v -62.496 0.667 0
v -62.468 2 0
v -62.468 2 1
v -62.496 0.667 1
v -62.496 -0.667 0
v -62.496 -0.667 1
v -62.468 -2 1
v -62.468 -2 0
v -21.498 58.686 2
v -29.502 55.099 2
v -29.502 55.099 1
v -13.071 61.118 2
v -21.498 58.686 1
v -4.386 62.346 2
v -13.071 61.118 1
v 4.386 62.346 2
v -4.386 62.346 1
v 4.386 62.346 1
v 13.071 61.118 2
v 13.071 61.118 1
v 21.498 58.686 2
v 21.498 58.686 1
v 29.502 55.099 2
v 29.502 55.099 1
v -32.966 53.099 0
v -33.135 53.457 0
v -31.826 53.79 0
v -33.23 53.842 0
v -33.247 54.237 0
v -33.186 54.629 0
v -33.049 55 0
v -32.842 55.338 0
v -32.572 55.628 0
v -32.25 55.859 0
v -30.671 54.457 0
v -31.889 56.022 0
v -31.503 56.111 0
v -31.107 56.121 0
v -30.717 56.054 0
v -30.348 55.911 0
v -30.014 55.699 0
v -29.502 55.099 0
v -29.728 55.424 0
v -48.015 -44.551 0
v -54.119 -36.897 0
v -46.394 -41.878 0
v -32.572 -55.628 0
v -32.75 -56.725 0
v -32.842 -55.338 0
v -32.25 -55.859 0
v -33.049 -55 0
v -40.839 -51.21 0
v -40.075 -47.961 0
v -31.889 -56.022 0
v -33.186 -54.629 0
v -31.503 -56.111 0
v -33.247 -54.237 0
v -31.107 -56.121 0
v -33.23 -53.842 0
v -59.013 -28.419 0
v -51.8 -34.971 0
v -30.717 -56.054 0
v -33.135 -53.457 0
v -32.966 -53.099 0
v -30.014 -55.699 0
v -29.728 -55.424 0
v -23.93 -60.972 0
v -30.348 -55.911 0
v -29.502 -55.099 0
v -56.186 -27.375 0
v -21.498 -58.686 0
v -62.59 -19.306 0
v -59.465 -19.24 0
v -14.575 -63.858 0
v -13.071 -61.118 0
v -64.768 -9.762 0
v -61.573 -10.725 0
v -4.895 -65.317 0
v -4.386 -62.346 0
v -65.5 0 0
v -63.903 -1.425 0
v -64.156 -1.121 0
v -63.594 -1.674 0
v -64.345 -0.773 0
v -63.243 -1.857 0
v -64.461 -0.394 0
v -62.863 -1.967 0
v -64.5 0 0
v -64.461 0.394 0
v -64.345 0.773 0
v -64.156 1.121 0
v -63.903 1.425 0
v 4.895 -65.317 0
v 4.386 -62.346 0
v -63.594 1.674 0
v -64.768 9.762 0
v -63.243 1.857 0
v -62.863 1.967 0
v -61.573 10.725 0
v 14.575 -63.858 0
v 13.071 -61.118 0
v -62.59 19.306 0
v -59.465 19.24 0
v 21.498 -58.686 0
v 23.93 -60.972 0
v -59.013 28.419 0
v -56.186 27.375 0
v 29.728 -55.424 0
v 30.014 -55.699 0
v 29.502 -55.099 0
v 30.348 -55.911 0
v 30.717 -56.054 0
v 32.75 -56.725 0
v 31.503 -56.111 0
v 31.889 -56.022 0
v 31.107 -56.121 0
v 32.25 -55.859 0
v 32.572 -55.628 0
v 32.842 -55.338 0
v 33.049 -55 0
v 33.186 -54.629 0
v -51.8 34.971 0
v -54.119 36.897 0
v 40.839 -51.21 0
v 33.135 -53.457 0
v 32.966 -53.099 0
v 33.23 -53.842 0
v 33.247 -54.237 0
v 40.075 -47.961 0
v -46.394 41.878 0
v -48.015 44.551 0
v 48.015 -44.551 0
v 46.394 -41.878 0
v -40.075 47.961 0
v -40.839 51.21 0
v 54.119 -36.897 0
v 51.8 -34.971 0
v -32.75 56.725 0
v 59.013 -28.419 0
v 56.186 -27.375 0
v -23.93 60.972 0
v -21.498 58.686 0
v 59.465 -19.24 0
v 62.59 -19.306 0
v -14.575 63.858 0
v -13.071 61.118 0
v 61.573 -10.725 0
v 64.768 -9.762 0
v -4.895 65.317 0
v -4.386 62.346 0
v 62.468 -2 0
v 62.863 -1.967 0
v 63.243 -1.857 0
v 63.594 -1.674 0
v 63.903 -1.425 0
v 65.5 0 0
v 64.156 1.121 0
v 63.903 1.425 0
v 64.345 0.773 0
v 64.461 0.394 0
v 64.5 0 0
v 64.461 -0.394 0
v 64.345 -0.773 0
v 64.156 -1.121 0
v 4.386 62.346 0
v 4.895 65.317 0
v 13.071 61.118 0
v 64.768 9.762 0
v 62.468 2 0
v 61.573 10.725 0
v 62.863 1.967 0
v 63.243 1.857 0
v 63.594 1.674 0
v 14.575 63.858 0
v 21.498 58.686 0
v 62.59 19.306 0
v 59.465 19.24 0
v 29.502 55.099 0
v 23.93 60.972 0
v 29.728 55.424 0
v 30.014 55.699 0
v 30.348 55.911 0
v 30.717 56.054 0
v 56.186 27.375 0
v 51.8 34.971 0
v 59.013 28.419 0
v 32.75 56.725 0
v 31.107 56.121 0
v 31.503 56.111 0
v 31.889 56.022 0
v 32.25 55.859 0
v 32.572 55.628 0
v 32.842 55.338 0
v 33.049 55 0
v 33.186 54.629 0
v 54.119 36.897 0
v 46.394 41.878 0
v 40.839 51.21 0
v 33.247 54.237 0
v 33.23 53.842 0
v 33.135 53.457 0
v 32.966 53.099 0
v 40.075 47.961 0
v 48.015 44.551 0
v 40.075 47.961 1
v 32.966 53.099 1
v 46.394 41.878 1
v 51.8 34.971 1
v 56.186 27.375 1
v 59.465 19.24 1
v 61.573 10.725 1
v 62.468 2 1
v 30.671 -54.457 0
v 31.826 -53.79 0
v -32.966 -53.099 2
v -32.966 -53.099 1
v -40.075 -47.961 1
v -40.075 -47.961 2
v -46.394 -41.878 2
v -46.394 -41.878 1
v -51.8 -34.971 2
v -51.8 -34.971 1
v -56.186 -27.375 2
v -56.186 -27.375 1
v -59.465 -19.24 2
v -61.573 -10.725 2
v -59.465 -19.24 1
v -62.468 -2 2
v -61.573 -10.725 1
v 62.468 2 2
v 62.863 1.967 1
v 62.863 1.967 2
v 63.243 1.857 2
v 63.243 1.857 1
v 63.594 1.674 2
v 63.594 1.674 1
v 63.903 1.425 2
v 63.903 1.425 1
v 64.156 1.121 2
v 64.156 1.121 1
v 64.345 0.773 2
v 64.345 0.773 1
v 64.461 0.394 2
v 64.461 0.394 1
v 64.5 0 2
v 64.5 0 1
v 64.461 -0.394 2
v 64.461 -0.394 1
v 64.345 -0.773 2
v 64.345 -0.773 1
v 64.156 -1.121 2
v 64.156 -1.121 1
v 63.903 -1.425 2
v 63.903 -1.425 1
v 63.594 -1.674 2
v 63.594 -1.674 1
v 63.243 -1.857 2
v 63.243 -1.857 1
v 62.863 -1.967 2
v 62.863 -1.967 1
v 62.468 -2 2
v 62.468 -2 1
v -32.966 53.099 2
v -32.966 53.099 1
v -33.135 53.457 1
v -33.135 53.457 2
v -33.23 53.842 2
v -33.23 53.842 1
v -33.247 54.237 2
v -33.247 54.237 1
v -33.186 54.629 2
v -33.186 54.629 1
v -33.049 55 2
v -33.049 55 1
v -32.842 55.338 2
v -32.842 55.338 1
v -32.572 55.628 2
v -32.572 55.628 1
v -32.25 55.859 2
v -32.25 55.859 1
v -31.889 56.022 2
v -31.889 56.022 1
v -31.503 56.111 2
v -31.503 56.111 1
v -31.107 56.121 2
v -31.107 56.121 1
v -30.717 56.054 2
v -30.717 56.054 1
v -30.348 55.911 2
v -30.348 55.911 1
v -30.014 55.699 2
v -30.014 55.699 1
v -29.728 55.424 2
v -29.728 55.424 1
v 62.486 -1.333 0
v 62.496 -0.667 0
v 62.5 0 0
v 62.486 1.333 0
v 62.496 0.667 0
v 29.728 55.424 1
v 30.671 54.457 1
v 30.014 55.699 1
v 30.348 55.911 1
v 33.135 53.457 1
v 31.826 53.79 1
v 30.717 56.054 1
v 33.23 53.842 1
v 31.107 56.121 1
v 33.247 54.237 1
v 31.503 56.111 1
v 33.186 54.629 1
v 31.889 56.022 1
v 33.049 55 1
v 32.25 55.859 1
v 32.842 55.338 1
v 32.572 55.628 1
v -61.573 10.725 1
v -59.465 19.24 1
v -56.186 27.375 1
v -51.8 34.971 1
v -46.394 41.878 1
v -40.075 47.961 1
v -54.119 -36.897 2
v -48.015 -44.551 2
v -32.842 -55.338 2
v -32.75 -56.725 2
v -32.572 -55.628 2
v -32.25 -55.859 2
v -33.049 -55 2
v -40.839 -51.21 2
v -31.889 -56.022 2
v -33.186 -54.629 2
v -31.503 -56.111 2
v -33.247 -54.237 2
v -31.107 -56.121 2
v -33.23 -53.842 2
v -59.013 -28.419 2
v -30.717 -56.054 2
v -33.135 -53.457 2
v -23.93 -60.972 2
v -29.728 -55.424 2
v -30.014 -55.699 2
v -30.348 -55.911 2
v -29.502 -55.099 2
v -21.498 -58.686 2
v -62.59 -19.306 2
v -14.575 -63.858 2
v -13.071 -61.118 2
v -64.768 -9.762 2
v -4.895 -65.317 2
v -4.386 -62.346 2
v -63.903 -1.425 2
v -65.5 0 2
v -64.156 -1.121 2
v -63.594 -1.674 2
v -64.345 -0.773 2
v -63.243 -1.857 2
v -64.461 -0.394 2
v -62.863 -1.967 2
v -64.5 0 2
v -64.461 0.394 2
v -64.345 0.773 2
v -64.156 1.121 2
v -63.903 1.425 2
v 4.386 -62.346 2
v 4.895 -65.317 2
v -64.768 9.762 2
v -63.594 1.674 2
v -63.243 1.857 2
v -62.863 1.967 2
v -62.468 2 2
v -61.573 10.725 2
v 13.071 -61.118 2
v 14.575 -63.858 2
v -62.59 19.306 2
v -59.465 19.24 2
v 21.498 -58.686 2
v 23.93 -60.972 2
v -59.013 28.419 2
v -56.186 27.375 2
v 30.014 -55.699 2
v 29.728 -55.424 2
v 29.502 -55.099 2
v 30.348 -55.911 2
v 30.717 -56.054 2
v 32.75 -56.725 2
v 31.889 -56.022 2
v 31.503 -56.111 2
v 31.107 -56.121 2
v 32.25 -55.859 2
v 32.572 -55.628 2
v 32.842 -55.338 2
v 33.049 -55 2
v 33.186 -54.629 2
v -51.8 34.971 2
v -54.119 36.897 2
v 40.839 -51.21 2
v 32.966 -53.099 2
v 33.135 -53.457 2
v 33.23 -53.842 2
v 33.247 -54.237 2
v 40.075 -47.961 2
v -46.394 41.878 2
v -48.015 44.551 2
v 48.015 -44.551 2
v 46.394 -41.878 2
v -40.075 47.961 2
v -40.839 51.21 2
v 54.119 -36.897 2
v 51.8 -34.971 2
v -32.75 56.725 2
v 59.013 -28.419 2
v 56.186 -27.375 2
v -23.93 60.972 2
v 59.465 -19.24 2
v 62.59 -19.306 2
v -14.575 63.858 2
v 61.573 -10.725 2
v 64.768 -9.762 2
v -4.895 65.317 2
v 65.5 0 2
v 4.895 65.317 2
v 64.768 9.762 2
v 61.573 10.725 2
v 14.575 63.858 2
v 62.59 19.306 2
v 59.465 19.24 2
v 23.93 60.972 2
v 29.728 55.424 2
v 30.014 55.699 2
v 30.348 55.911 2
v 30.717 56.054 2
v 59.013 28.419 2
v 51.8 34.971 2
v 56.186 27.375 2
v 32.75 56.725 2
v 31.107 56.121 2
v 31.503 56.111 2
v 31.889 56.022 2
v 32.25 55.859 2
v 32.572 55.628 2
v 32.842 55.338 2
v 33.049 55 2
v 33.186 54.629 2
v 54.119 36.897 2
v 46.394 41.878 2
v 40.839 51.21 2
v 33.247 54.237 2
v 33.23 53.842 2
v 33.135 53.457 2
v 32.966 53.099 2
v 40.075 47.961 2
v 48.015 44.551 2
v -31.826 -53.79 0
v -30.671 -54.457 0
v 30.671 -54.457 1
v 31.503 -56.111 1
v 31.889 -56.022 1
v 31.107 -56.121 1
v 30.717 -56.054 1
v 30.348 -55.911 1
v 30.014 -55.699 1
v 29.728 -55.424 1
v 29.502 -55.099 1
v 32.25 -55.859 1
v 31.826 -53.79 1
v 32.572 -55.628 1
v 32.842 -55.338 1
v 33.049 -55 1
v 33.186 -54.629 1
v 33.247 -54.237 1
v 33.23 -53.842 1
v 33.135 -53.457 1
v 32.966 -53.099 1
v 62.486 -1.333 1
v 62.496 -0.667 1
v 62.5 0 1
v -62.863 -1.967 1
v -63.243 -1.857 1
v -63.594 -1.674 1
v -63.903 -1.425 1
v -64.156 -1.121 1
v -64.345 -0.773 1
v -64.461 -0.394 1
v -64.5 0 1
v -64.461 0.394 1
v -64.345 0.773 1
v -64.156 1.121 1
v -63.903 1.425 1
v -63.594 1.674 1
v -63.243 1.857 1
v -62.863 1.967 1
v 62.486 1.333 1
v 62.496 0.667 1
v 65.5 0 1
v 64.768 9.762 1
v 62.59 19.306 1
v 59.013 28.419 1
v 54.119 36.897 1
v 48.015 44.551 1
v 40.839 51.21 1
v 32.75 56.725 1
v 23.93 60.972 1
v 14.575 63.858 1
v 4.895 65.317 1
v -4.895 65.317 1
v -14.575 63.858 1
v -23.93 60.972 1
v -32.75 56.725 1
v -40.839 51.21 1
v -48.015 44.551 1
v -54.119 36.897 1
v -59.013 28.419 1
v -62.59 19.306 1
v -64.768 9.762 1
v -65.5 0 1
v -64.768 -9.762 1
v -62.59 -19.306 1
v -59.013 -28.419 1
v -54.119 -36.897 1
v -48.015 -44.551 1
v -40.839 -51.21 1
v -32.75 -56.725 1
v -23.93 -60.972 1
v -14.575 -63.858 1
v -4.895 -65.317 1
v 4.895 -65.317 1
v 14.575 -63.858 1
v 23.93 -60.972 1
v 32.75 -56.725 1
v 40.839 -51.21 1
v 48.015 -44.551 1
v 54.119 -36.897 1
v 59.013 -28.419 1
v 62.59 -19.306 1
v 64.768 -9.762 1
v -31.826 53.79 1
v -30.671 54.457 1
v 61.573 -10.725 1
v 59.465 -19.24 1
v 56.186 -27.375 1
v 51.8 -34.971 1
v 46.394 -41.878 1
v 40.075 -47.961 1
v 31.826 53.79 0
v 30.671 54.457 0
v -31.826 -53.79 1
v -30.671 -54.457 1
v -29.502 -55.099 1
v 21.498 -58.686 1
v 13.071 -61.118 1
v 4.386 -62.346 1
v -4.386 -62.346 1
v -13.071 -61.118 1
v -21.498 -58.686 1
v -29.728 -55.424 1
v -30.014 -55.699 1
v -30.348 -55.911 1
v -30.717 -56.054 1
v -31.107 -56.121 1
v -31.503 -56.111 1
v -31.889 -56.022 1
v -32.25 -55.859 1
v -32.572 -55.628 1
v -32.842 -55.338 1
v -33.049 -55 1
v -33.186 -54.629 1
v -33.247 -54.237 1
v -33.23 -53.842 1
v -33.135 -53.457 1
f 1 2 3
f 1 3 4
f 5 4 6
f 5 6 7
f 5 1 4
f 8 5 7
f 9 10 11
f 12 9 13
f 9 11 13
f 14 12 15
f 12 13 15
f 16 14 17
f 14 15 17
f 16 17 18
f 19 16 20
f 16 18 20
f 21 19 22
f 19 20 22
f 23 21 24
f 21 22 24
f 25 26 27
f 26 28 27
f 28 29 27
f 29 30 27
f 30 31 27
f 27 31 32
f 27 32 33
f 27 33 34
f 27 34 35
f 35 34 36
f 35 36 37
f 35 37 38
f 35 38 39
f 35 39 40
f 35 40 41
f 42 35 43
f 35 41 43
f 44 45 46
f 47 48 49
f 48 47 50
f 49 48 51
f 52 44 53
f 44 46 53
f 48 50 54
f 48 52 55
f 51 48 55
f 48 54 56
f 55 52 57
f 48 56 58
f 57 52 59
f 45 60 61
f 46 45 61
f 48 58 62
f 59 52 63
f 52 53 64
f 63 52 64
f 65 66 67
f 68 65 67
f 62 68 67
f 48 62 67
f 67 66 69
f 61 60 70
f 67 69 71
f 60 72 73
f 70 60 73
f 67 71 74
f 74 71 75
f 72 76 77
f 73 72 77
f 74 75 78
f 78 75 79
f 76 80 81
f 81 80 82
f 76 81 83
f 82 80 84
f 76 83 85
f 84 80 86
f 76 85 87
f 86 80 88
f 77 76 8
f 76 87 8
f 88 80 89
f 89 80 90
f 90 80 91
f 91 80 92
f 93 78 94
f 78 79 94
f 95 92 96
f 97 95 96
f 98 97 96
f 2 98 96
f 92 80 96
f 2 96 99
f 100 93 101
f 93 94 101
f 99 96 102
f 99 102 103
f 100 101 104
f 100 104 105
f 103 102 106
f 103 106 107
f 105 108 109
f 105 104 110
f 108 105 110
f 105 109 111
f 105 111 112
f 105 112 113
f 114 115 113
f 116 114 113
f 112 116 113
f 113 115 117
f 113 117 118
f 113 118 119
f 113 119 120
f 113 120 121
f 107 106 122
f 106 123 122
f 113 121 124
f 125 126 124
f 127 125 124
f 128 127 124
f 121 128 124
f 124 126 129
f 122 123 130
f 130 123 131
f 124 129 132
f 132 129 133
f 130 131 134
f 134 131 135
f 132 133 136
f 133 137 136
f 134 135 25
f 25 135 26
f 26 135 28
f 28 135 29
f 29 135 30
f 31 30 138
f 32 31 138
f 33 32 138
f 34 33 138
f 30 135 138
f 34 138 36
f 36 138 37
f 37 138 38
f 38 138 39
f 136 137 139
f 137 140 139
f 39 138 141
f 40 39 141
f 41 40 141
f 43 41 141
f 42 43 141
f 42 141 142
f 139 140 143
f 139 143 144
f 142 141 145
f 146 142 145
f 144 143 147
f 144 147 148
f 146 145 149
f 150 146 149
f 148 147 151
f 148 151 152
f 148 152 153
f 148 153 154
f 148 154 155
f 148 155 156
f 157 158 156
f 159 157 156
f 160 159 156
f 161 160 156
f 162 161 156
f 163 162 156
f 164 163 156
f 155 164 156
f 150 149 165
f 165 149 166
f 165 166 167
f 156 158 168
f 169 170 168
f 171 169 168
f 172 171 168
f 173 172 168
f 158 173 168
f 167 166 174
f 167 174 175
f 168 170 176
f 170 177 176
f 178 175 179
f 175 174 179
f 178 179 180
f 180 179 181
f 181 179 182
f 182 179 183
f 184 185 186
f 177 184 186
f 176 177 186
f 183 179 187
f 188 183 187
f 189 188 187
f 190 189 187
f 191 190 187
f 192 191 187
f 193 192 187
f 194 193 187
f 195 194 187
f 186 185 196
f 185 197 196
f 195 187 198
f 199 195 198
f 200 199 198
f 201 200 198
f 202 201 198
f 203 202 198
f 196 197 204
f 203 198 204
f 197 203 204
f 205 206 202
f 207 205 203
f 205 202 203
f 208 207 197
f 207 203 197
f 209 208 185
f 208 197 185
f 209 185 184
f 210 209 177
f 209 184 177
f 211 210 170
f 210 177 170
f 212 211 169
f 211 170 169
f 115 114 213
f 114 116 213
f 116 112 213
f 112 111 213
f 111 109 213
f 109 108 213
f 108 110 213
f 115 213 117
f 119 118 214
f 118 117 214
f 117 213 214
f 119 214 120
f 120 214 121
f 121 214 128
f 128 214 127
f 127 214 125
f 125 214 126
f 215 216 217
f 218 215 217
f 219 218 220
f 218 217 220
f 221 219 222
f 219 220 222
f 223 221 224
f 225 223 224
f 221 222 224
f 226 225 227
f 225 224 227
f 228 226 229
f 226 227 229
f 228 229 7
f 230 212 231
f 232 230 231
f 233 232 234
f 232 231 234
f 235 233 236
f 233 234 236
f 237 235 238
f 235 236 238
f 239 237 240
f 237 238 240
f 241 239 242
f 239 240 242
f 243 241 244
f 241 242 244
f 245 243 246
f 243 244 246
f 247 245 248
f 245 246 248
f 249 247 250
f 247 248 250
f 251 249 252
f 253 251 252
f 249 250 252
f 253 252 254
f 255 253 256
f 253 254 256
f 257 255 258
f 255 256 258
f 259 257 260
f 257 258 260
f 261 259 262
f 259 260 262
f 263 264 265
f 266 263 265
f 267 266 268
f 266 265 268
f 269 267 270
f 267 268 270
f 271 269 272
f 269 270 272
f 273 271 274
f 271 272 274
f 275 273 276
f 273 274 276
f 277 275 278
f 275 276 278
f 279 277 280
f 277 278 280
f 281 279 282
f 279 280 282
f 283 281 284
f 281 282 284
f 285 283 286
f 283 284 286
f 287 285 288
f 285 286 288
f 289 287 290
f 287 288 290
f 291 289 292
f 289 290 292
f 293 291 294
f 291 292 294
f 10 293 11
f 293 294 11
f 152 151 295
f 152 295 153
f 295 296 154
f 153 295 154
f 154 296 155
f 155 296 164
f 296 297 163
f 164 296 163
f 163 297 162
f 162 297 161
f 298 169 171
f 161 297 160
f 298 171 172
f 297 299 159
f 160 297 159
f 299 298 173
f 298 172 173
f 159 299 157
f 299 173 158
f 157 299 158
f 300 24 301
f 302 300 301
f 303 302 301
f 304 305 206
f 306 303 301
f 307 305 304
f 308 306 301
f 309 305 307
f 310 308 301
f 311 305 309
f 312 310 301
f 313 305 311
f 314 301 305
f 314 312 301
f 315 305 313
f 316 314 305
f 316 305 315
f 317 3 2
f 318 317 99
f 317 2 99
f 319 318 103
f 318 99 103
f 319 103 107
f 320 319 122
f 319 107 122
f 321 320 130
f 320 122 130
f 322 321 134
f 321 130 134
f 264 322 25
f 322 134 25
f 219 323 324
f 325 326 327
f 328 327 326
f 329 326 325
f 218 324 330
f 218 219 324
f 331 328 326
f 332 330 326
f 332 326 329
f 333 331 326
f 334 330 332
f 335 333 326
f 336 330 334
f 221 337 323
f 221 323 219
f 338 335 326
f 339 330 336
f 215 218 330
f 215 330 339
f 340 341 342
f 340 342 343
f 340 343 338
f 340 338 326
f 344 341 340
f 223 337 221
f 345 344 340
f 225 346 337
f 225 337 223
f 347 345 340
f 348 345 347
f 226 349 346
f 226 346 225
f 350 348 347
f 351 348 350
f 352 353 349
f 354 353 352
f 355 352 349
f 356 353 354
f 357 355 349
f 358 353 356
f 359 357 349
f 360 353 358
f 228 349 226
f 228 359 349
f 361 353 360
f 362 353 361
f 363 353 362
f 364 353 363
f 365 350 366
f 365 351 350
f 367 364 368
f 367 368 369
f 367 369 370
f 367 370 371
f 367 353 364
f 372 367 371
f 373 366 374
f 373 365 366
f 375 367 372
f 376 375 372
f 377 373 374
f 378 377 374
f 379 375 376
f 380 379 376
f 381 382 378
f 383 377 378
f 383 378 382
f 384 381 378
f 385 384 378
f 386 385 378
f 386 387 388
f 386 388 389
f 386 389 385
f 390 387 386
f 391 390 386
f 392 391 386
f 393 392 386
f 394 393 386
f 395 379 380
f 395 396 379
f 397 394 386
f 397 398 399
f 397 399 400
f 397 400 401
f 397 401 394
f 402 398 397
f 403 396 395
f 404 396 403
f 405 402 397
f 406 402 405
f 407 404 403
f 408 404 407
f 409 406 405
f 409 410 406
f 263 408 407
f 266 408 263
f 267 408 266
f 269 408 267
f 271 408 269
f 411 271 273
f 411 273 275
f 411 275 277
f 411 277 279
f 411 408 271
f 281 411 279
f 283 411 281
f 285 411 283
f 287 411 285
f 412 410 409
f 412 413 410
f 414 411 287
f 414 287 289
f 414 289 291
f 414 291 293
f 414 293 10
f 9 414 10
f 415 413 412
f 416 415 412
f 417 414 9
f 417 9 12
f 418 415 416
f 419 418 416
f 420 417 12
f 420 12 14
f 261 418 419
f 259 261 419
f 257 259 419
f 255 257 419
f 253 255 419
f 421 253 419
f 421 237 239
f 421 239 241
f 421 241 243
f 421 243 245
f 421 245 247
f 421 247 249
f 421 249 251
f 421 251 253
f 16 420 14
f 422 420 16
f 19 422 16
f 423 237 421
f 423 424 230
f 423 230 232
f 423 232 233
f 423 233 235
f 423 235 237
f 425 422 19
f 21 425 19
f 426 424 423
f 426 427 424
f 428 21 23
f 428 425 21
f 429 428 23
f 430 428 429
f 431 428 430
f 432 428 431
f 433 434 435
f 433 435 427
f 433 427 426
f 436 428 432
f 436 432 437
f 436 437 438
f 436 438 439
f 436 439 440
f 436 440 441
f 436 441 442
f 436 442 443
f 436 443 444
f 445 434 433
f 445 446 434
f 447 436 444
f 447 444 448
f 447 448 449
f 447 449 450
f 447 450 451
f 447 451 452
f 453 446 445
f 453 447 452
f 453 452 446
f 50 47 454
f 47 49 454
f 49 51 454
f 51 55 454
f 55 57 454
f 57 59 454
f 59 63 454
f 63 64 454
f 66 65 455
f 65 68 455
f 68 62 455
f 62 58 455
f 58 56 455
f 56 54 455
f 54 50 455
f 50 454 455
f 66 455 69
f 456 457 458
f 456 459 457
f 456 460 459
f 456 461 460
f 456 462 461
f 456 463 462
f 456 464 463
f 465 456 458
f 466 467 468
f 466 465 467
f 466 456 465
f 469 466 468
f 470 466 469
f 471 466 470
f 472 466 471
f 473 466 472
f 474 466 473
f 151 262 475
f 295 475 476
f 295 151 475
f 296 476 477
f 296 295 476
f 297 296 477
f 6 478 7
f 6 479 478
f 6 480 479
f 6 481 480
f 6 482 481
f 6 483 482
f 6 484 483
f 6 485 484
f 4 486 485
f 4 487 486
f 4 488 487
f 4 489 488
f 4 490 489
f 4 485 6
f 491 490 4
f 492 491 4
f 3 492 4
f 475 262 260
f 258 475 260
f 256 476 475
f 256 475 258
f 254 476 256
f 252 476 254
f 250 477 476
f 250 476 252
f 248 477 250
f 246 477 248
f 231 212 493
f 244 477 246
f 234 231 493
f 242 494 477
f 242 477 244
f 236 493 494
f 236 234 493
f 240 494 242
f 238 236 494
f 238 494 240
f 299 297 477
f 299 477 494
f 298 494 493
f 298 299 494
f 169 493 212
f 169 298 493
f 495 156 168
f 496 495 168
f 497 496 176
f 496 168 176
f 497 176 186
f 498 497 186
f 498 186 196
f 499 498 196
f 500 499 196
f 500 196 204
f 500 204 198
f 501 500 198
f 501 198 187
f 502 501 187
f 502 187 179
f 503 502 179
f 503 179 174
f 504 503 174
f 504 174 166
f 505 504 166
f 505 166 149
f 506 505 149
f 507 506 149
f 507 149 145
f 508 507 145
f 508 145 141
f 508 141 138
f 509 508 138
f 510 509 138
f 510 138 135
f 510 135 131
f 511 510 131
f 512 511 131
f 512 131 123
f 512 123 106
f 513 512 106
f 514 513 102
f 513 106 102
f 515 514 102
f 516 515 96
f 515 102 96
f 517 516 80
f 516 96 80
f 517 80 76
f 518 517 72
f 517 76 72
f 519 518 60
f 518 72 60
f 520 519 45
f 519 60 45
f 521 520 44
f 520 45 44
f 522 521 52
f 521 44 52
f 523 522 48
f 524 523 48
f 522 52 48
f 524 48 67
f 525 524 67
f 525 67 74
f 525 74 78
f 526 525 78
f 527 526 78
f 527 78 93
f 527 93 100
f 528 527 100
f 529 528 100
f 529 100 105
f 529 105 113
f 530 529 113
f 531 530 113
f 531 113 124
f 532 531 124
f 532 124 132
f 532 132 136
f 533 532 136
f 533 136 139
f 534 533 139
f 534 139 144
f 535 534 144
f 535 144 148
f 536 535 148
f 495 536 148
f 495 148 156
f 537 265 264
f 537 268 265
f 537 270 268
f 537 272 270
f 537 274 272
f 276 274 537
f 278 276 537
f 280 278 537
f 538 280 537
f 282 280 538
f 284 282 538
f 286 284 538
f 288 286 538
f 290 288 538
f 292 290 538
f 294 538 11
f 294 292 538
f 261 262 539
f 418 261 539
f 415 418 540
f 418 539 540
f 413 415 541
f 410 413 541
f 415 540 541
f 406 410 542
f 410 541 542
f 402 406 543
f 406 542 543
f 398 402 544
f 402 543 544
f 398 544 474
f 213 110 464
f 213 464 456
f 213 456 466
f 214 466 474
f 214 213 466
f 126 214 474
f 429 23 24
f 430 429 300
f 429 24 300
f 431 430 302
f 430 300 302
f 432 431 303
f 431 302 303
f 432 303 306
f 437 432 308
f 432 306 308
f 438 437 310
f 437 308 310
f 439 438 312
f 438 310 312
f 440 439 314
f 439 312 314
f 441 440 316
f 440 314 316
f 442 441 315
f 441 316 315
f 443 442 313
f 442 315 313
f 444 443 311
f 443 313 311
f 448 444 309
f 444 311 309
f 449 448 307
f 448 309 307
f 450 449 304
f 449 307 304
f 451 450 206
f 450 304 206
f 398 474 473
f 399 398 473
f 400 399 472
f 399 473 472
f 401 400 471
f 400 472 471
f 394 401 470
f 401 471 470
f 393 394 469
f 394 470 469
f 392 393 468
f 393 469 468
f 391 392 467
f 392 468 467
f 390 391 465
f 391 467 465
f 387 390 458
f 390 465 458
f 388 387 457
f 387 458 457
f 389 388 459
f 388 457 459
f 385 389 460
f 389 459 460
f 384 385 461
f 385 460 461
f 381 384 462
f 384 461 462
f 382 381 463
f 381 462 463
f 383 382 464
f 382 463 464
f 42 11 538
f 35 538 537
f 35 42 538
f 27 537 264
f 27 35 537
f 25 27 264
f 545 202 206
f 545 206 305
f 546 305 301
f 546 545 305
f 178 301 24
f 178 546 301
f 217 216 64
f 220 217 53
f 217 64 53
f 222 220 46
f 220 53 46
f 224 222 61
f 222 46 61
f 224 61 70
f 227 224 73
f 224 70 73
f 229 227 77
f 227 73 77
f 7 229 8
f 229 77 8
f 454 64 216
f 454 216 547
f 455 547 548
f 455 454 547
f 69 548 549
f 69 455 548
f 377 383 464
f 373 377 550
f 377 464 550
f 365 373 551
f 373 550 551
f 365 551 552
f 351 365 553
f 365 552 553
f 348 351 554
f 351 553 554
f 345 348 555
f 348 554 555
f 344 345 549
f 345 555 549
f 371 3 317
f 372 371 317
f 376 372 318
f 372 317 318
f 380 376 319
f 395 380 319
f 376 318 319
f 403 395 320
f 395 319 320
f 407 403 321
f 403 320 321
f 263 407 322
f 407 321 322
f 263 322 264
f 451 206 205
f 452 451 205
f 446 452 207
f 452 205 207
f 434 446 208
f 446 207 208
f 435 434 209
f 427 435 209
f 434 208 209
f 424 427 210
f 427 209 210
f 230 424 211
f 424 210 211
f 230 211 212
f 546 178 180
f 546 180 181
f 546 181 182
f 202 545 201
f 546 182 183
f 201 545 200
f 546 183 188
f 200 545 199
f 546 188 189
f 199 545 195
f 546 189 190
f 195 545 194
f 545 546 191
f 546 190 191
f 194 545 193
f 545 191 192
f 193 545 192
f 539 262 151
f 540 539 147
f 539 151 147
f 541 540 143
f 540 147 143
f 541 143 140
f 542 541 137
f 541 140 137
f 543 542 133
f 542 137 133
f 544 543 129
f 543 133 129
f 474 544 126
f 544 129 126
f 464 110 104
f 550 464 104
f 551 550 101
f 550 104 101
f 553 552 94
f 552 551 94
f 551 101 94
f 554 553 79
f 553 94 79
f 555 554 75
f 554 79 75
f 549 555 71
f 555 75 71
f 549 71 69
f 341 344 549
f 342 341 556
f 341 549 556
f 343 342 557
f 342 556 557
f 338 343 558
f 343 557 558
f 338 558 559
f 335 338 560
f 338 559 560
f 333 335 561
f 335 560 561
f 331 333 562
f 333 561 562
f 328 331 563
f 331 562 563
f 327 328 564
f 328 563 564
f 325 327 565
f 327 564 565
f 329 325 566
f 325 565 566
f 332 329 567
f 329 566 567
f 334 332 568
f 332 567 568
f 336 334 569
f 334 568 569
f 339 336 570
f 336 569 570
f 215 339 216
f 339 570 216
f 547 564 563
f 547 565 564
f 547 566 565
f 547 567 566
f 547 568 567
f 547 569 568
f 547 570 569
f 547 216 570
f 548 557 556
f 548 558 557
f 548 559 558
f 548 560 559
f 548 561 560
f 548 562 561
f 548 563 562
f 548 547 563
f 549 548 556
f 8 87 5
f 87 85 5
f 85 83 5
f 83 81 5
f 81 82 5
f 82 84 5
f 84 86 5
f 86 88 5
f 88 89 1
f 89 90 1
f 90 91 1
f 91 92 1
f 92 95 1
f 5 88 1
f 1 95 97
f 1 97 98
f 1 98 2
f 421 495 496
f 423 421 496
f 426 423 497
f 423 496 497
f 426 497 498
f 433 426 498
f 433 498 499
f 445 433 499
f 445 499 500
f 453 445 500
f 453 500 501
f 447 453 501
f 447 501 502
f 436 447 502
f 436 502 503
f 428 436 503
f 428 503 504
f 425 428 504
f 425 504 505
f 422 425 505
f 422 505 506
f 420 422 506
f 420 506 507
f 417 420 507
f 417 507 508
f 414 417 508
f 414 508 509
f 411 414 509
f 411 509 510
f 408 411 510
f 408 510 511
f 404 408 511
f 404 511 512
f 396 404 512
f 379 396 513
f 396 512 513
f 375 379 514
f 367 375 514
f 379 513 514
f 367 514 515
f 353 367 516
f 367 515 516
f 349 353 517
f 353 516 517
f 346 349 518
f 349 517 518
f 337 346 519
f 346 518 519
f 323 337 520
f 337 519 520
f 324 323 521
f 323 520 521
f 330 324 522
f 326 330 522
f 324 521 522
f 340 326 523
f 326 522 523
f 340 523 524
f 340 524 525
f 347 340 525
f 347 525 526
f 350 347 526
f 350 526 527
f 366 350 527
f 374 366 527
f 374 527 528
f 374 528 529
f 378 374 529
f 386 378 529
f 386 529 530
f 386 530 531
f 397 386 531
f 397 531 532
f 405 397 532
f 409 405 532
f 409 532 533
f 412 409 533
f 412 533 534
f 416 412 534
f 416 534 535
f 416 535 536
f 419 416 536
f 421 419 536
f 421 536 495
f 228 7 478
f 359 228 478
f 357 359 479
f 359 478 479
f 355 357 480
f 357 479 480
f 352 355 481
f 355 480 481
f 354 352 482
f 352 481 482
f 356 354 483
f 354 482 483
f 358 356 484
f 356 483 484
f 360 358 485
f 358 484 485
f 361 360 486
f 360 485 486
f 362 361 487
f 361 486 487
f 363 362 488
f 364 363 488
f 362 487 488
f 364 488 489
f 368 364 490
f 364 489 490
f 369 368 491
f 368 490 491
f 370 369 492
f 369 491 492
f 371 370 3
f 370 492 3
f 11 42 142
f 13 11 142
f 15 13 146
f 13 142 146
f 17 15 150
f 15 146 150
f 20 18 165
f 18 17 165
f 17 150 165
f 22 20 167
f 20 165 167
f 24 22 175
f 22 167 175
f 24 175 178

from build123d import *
from build123d import SkipClean  # not in build123d's __all__

# Parameters (mm, degrees)
F0_R     = 65.5
F1_DEPTH = 2
F2_R     = 65.5
F2_R_2   = 62.5
F3_DEPTH = 1


with BuildPart() as f1:
    # F0 (on Top) → F1 (new body)
    with BuildSketch(Plane.XY):
        Circle(F0_R)
        with BuildLine():
            ThreePointArc((32.9658290909, 53.0990029318), (54.1265877365, 31.25), (62.468, 1.9997439836))
            ThreePointArc((62.468, 1.9997439836), (64.5, 0), (62.468, -1.9997439836))
            ThreePointArc((62.468, -1.9997439836), (54.1265877365, -31.25), (32.9658290909, -53.0990029318))
            ThreePointArc((32.9658290909, -53.0990029318), (32.25, -55.8586385441), (29.5021709091, -55.0987469154))
            ThreePointArc((29.5021709091, -55.0987469154), (0, -62.5), (-29.5021709091, -55.0987469154))
            ThreePointArc((-29.5021709091, -55.0987469154), (-32.25, -55.8586385441), (-32.9658290909, -53.0990029318))
            ThreePointArc((-32.9658290909, -53.0990029318), (-54.1265877365, -31.25), (-62.468, -1.9997439836))
            ThreePointArc((-62.468, -1.9997439836), (-64.5, 0), (-62.468, 1.9997439836))
            ThreePointArc((-62.468, 1.9997439836), (-54.1265877365, 31.25), (-32.9658290909, 53.0990029318))
            ThreePointArc((-32.9658290909, 53.0990029318), (-32.25, 55.8586385441), (-29.5021709091, 55.0987469154))
            ThreePointArc((-29.5021709091, 55.0987469154), (0, 62.5), (29.5021709091, 55.0987469154))
            ThreePointArc((29.5021709091, 55.0987469154), (32.25, 55.8586385441), (32.9658290909, 53.0990029318))
        make_face(mode=Mode.SUBTRACT)
    extrude(amount=F1_DEPTH)

    # F2 (on Top) → F3 (join)
    with BuildSketch(Plane.XY):
        Circle(F2_R)
        Circle(F2_R_2, mode=Mode.SUBTRACT)
    with SkipClean():  # cleaning this boolean's faces spoils the solid; the shape is the same uncleaned
        extrude(amount=F3_DEPTH)


solid = f1.part
